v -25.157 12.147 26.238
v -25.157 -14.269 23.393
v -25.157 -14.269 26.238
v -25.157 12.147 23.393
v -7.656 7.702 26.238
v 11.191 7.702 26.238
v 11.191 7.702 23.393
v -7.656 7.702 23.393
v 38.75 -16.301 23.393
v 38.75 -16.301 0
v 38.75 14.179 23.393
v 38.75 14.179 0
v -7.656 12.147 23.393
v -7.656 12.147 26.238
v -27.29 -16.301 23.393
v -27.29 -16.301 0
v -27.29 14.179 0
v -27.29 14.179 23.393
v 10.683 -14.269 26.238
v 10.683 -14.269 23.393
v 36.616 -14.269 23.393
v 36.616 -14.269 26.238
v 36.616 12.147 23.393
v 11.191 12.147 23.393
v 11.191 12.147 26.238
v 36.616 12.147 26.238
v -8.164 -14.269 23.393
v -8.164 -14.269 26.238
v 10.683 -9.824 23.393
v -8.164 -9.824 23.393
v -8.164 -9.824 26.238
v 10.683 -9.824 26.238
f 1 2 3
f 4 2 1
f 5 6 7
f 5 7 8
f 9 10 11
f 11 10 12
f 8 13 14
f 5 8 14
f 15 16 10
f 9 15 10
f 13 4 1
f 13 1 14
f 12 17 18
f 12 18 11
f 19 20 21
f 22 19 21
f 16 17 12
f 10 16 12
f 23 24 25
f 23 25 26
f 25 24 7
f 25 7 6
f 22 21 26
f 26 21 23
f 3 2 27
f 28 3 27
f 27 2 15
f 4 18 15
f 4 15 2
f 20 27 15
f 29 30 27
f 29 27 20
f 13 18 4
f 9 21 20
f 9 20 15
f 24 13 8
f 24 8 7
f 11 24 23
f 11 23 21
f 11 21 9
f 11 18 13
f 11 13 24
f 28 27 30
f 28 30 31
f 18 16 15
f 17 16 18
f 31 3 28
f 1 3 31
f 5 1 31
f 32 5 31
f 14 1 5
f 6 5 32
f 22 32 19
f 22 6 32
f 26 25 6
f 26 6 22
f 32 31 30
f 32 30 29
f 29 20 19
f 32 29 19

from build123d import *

# Parameters (mm, degrees)
F0_W     = 66.04
F0_H     = 30.48
F0_W_2   = 61.7728
F0_H_2   = 26.416
F1_DEPTH = 23.3934
F2_DEPTH = 26.2382
F3_W     = 18.8468
F3_H     = 2.8448
F4_DEPTH = 4.445
F5_W     = 18.8468
F5_H     = 2.8448
F6_DEPTH = 4.445


with BuildPart() as f1:
    # F0 (on Top) → F1 (new body)
    with BuildSketch(Plane.XY):
        with Locations((5.729598, -1.061104)):
            Rectangle(F0_W, F0_H)
        with Locations((5.729598, -1.061104)):
            Rectangle(F0_W_2, F0_H_2, mode=Mode.SUBTRACT)
    extrude(amount=F1_DEPTH)

    # F0 (on Top) → F2 (join)
    with BuildSketch(Plane.XY):
        with Locations((5.729598, -1.061104)):
            Rectangle(F0_W_2, F0_H_2)
    extrude(amount=F2_DEPTH)

    # F3 (on face) → F4 (cut)
    with BuildSketch(Plane.XZ.offset(14.269104)):
        with Locations((1.259198, 24.8158)):
            Rectangle(F3_W, F3_H)
    extrude(amount=-F4_DEPTH, mode=Mode.SUBTRACT)

    # F5 (on face) → F6 (cut)
    with BuildSketch(Plane(origin=(0, 12.146896, 0), x_dir=(-1, 0, 0), z_dir=(0, 1, 0))):
        with Locations((-1.767198, 24.8158)):
            Rectangle(F5_W, F5_H)
    extrude(amount=-F6_DEPTH, mode=Mode.SUBTRACT)


solid = f1.part
